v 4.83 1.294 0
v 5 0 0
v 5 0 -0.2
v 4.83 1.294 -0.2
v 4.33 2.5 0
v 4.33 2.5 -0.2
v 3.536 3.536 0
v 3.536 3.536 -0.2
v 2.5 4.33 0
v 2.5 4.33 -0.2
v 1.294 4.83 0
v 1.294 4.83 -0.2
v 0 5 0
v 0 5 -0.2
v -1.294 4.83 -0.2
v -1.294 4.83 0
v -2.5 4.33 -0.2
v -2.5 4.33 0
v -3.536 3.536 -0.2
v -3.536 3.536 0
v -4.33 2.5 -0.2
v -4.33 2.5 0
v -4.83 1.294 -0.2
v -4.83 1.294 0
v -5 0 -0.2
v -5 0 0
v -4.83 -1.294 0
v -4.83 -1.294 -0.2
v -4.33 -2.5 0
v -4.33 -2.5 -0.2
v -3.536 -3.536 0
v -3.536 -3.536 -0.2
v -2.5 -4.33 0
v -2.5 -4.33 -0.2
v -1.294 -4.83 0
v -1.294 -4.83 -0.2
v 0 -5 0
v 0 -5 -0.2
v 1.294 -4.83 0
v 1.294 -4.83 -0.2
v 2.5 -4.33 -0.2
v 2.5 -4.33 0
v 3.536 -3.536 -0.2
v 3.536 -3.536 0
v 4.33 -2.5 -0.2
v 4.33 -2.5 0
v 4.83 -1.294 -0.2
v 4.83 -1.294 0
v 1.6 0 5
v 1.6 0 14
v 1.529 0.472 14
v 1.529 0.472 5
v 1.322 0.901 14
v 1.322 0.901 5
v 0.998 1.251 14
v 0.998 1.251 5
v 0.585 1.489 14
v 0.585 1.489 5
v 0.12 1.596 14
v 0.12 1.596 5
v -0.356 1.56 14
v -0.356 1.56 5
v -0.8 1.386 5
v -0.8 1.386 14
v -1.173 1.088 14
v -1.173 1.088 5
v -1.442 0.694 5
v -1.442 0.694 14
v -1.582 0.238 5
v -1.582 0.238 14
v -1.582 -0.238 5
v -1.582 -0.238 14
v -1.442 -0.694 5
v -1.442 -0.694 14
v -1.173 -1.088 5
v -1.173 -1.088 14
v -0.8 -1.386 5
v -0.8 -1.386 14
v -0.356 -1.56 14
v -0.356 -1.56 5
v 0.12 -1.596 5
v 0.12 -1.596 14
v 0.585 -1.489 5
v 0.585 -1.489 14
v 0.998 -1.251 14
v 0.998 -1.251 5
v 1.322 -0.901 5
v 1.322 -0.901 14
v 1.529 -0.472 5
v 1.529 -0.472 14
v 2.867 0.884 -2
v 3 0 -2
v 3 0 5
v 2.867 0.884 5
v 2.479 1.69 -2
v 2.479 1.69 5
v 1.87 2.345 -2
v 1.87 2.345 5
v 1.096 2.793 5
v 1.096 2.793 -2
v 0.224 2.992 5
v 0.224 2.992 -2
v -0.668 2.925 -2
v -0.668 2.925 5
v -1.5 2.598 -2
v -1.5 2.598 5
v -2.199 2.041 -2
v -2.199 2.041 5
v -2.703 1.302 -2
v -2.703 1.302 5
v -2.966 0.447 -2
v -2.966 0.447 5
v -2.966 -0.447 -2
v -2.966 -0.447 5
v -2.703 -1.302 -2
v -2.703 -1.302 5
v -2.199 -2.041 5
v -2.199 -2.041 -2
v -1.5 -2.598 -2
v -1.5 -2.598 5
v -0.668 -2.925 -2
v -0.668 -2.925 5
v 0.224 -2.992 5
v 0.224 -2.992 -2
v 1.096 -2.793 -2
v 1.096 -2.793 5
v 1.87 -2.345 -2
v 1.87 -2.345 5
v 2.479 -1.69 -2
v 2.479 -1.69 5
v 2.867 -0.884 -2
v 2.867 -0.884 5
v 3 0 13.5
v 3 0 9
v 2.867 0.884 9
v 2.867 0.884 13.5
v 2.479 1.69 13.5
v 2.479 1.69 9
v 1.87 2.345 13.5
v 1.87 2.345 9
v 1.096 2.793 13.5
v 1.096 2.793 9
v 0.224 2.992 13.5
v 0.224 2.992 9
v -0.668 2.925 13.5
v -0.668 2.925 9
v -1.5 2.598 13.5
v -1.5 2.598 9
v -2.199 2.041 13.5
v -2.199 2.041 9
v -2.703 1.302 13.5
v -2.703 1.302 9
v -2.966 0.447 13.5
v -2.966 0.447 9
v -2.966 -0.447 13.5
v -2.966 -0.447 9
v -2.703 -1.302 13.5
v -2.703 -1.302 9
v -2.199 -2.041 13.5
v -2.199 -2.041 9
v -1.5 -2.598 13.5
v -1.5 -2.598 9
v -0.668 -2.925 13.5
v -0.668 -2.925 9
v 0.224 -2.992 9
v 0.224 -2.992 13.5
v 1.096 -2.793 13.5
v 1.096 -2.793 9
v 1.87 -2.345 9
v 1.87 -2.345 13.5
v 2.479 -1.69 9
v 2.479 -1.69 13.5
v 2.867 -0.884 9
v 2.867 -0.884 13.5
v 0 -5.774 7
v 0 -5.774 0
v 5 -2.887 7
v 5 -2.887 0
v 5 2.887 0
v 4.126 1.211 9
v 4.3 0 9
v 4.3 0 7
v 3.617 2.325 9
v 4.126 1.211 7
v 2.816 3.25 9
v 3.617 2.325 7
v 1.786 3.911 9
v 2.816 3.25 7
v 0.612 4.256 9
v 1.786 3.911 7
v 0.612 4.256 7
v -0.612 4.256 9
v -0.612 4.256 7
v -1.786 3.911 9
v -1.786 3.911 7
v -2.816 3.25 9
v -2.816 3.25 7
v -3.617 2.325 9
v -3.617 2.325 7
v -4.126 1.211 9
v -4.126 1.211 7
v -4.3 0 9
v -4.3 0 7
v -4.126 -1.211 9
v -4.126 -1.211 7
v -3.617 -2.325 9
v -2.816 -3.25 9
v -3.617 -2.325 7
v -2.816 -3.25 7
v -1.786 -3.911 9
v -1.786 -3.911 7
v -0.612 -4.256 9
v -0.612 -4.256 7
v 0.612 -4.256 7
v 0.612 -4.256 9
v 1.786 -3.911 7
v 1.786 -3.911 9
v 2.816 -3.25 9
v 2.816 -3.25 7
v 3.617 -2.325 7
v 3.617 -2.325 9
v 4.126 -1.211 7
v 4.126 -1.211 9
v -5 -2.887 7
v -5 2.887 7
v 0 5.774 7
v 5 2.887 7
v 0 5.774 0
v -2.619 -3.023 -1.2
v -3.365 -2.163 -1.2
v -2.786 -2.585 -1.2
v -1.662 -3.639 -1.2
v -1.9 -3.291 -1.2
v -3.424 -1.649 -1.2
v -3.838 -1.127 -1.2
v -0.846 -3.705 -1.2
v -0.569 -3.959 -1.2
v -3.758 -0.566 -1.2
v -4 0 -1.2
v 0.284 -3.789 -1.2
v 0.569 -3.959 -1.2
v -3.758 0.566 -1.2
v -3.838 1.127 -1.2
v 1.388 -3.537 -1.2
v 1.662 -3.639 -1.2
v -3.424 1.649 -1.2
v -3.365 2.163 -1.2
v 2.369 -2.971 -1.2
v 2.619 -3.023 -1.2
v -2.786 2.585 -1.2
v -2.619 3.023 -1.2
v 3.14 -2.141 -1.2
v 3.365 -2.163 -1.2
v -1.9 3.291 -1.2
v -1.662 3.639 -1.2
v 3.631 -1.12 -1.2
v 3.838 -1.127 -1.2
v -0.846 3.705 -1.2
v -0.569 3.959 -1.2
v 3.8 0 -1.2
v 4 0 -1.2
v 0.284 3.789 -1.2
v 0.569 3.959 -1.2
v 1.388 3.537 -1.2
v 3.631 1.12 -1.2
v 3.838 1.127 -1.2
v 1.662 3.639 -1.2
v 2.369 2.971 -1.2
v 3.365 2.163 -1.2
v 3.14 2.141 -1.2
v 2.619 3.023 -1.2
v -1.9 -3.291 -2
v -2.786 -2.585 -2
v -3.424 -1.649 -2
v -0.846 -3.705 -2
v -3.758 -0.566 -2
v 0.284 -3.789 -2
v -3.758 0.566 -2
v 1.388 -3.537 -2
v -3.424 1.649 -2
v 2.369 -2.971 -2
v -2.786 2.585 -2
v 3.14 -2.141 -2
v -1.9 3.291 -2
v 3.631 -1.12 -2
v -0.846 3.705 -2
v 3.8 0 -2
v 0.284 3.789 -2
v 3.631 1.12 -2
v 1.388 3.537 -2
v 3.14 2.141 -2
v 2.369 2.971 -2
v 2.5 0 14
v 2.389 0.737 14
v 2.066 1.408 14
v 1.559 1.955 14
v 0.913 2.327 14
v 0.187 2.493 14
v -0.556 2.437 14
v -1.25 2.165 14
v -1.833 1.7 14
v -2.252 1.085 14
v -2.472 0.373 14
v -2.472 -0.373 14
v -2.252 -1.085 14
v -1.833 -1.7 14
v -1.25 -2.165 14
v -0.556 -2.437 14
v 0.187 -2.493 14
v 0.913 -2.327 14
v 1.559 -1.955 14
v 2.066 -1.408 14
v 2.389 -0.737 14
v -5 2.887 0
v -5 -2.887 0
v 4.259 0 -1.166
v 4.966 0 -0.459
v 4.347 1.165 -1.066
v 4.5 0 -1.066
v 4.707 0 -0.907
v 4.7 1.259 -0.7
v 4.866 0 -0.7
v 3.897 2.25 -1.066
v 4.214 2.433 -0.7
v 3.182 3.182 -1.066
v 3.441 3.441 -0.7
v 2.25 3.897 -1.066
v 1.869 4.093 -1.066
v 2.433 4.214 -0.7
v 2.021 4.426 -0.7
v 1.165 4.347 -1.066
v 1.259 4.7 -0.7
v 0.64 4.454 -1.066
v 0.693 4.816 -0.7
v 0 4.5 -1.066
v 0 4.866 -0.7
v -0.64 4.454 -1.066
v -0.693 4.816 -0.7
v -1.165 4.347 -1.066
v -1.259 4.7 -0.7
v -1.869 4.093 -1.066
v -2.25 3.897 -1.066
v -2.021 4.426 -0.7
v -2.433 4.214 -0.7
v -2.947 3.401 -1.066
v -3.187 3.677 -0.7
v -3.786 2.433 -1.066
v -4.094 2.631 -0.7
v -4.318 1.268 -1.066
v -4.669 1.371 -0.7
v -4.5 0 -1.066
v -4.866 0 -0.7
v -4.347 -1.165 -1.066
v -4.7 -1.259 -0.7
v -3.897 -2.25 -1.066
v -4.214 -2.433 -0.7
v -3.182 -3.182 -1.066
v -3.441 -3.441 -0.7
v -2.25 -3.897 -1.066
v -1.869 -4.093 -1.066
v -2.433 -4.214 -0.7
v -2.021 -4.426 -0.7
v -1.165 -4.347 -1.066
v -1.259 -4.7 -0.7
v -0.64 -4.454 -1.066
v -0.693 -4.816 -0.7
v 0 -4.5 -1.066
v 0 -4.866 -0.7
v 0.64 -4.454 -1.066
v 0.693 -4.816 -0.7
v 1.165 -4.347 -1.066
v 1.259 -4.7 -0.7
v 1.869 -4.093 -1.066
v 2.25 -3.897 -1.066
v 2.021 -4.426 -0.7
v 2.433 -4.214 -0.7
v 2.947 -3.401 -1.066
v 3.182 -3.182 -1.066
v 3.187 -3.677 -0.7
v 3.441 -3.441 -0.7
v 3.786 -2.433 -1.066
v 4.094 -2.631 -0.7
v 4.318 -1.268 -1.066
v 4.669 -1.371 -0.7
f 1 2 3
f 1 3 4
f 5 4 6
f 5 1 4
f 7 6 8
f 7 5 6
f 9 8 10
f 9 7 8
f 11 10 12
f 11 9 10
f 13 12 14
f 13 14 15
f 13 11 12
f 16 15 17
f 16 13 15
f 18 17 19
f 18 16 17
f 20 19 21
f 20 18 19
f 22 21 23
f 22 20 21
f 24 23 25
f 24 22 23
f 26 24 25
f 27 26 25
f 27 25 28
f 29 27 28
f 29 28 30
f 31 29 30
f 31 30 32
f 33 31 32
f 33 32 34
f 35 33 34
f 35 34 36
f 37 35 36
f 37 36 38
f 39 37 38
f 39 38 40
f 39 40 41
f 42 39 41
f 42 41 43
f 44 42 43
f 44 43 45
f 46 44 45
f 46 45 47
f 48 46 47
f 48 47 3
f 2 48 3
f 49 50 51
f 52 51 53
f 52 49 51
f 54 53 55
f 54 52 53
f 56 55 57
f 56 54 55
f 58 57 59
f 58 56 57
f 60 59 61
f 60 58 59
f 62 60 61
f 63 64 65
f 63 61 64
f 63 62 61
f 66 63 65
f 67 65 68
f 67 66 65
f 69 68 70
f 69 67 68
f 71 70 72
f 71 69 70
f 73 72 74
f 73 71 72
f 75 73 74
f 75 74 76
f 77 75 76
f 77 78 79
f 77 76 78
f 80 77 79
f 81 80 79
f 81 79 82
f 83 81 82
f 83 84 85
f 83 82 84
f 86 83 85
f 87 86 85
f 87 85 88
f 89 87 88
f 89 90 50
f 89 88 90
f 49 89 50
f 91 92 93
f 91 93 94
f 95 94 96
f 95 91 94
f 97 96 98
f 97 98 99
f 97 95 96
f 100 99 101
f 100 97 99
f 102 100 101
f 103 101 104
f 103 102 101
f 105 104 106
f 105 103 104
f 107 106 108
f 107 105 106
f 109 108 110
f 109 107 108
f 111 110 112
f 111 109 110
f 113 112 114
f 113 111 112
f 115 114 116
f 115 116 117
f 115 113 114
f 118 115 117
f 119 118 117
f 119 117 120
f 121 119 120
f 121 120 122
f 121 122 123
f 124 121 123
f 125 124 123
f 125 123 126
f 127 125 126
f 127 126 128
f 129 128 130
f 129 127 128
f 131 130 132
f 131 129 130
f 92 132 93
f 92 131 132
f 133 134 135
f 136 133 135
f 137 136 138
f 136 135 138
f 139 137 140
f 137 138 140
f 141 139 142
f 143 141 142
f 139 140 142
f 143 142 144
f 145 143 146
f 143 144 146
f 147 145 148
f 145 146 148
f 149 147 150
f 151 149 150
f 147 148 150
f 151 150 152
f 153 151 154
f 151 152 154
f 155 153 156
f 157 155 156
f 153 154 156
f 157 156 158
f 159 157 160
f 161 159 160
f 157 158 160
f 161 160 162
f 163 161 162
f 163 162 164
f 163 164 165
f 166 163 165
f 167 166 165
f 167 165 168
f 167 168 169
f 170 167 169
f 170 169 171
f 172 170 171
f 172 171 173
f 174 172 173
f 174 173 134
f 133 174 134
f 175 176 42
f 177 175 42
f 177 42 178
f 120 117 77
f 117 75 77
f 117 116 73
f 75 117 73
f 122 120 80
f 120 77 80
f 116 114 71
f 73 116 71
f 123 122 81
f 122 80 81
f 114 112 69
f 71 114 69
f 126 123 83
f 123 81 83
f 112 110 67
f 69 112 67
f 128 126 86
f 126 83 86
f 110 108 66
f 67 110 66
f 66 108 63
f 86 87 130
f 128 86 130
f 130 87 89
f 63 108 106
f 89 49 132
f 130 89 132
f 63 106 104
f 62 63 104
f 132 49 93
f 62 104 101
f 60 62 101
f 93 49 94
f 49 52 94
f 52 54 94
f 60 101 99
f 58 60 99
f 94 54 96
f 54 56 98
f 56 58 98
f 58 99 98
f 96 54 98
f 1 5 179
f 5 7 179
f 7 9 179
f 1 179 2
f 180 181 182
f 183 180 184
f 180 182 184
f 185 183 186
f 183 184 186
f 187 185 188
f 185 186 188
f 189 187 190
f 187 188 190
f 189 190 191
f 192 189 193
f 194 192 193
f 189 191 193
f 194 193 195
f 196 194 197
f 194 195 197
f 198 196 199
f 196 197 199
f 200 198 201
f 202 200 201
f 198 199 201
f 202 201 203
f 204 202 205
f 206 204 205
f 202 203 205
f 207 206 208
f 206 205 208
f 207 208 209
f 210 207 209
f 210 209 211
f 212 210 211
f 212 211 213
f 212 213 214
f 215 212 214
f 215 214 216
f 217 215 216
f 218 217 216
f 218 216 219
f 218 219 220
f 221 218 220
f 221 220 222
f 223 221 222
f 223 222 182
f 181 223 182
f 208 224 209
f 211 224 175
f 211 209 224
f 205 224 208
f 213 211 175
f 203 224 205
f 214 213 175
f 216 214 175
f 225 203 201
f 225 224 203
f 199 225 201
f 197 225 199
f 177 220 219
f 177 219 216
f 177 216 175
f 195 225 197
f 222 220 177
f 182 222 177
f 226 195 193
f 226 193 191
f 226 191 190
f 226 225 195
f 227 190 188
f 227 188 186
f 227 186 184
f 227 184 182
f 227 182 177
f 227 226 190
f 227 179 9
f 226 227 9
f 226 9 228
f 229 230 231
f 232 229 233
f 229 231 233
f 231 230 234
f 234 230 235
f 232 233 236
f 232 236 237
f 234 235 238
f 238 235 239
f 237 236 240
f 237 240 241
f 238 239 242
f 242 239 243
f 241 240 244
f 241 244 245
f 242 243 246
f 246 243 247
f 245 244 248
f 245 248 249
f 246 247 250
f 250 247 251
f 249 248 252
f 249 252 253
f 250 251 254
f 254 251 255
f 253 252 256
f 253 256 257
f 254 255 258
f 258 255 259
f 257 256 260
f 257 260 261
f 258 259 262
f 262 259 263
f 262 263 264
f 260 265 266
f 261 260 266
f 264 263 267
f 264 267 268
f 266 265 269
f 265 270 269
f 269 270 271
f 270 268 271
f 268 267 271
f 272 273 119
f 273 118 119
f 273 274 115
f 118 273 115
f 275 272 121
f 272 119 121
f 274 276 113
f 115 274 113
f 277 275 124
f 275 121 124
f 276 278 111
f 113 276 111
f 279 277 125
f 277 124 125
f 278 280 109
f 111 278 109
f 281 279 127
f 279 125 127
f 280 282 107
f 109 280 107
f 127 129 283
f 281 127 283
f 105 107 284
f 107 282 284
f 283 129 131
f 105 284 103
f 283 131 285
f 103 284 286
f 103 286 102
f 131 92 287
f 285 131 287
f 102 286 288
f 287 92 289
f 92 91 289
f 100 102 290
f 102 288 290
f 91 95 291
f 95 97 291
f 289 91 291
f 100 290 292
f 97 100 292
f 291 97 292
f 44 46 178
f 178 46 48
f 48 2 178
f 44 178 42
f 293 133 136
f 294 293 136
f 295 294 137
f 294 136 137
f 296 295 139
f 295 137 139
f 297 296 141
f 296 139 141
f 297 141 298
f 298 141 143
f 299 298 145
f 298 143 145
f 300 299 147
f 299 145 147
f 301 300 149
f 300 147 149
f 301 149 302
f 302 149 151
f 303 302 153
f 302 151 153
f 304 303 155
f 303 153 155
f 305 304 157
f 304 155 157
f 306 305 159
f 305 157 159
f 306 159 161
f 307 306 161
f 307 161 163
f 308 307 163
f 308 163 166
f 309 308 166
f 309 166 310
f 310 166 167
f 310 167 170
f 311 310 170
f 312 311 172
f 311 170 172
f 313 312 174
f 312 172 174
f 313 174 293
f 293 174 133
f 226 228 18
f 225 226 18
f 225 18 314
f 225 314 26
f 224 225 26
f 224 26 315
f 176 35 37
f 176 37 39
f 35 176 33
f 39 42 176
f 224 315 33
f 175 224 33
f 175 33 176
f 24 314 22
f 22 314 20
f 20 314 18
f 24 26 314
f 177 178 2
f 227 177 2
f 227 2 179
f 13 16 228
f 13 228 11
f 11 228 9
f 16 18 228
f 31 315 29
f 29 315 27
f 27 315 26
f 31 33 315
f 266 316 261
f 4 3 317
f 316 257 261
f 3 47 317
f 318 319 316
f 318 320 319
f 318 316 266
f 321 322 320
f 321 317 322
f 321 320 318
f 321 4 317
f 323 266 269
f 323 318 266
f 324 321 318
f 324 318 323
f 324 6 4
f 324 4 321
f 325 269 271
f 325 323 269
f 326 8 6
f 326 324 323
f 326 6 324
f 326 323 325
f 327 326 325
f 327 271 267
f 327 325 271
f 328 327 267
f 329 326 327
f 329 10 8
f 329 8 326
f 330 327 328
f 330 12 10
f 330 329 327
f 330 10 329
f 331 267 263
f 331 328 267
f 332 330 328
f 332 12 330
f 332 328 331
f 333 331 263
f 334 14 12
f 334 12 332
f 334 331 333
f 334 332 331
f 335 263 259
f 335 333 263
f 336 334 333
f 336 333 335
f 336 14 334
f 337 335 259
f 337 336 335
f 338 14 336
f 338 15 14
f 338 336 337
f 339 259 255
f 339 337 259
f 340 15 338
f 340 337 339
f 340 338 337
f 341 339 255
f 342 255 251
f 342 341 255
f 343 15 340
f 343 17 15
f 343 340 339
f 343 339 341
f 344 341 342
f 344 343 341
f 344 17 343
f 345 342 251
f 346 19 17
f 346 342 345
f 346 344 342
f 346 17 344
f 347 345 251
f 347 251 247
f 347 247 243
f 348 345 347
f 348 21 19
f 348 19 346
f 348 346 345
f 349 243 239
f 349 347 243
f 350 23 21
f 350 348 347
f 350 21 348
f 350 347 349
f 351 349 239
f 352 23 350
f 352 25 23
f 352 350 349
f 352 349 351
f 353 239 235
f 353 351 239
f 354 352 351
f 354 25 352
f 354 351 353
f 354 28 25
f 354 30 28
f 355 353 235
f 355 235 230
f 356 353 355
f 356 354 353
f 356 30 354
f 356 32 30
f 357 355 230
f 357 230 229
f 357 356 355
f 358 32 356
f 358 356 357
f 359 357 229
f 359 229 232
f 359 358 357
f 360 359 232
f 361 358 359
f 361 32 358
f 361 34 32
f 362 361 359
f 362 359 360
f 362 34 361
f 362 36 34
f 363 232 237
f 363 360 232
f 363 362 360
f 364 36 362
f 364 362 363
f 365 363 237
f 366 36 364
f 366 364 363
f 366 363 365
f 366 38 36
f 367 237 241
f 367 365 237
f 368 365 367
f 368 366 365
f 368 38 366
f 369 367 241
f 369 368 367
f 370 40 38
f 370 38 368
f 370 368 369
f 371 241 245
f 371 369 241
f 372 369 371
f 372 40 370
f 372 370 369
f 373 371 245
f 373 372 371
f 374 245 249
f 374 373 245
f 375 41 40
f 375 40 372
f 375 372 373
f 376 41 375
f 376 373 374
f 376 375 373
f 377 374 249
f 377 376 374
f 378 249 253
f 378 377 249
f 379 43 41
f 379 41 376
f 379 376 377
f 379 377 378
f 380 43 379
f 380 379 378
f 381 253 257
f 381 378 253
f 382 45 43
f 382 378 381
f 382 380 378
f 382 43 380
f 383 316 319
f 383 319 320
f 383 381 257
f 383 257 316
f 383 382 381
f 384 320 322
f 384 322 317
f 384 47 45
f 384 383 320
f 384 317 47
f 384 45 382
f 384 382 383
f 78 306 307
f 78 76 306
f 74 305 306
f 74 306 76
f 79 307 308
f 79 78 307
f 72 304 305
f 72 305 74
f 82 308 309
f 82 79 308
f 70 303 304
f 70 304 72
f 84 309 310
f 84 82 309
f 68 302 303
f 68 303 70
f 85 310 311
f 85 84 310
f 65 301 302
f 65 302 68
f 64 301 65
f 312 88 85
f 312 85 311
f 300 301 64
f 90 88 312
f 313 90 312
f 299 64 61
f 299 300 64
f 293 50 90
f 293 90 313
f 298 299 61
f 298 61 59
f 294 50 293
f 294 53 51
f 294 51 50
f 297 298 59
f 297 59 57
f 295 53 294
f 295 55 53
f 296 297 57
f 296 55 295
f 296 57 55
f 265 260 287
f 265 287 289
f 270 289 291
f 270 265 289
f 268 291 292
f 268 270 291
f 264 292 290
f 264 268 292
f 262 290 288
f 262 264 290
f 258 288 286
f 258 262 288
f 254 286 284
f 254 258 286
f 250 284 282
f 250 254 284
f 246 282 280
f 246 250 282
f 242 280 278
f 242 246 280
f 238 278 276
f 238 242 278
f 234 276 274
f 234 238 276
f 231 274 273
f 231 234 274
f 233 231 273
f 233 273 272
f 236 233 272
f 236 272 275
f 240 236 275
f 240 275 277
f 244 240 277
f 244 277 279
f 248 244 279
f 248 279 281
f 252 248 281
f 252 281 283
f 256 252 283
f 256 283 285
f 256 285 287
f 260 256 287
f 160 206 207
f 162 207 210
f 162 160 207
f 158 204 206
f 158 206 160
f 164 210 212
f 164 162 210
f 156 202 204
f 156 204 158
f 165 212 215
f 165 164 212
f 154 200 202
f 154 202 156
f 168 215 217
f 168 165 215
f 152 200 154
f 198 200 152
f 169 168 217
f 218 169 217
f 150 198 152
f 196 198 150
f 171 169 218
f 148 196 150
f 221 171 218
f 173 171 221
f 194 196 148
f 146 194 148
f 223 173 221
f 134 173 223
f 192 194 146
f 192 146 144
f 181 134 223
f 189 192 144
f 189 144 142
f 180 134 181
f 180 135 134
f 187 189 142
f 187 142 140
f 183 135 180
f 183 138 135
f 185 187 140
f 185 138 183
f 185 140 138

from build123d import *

# Parameters (mm, degrees)
EXTRUDE_2_DEPTH      = 7
SKETCH_1_4_R         = 5
EXTRUDE_3_DEPTH      = 1.2
SKETCH_1_5_R         = 3
EXTRUDE_4_DEPTH      = 14
SKETCH_1_6_R         = 4.3
EXTRUDE_5_DEPTH      = 9
SKETCH_1_8_R         = 3.8
EXTRUDE_6_DEPTH      = 2
FILLET_1_R           = 1
CUT_EXTRUDE_START    = -2
SKETCH_1_10_R        = 1.6
CUT_EXTRUDE_31_DEPTH = 17
SKETCH_1_11_R        = 3
SKETCH_1_11_R_2      = 1.6
CUT_EXTRUDE_32_DEPTH = 7
CHAMFER_1_SIZE       = 0.5


with BuildPart() as part:
    # Эскиз1 → Бобышка-Вытянуть2 (new body)
    with BuildSketch(Plane.XY):
        Polygon((0, 5.773502692), (-5, 2.886751346), (-5, -2.886751346), (0, -5.773502692), (5, -2.886751346), (5, 2.886751346), align=None)
    extrude(amount=EXTRUDE_2_DEPTH)

    # Эскиз1<4> → Бобышка-Вытянуть3 (add)
    with BuildSketch(Plane.XY):
        Circle(SKETCH_1_4_R)
    extrude(amount=-EXTRUDE_3_DEPTH)

    # Эскиз1<5> → Бобышка-Вытянуть4 (add)
    with BuildSketch(Plane.XY):
        Circle(SKETCH_1_5_R)
    extrude(amount=EXTRUDE_4_DEPTH)

    # Эскиз1<6> → Бобышка-Вытянуть5 (add)
    with BuildSketch(Plane.XY):
        Circle(SKETCH_1_6_R)
    extrude(amount=EXTRUDE_5_DEPTH)

    # Эскиз1<8> → Бобышка-Вытянуть6 (add)
    with BuildSketch(Plane.XY):
        Circle(SKETCH_1_8_R)
    extrude(amount=-EXTRUDE_6_DEPTH)

    # Скругление1
    fillet_1_edges = [part.edges().sort_by_distance(p)[0] for p in [
        (-5, 0, -1.2),
    ]]
    fillet(fillet_1_edges, radius=FILLET_1_R)

    # Эскиз1<10> → Вырез-Вытянуть31 (cut, through all)
    with BuildSketch(Plane.XY.offset(CUT_EXTRUDE_START)):
        Circle(SKETCH_1_10_R)
    extrude(amount=CUT_EXTRUDE_31_DEPTH, mode=Mode.SUBTRACT)

    # Эскиз1<11> → Вырез-Вытянуть32 (cut)
    with BuildSketch(Plane.XY.offset(CUT_EXTRUDE_START)):
        Circle(SKETCH_1_11_R)
        Circle(SKETCH_1_11_R_2, mode=Mode.SUBTRACT)
    extrude(amount=CUT_EXTRUDE_32_DEPTH, mode=Mode.SUBTRACT)

    # Фаска1
    chamfer_1_edges = [part.edges().sort_by_distance(p)[0] for p in [
        (-3, 0, 14),
    ]]
    chamfer(chamfer_1_edges, length=CHAMFER_1_SIZE)


solid = part.part
